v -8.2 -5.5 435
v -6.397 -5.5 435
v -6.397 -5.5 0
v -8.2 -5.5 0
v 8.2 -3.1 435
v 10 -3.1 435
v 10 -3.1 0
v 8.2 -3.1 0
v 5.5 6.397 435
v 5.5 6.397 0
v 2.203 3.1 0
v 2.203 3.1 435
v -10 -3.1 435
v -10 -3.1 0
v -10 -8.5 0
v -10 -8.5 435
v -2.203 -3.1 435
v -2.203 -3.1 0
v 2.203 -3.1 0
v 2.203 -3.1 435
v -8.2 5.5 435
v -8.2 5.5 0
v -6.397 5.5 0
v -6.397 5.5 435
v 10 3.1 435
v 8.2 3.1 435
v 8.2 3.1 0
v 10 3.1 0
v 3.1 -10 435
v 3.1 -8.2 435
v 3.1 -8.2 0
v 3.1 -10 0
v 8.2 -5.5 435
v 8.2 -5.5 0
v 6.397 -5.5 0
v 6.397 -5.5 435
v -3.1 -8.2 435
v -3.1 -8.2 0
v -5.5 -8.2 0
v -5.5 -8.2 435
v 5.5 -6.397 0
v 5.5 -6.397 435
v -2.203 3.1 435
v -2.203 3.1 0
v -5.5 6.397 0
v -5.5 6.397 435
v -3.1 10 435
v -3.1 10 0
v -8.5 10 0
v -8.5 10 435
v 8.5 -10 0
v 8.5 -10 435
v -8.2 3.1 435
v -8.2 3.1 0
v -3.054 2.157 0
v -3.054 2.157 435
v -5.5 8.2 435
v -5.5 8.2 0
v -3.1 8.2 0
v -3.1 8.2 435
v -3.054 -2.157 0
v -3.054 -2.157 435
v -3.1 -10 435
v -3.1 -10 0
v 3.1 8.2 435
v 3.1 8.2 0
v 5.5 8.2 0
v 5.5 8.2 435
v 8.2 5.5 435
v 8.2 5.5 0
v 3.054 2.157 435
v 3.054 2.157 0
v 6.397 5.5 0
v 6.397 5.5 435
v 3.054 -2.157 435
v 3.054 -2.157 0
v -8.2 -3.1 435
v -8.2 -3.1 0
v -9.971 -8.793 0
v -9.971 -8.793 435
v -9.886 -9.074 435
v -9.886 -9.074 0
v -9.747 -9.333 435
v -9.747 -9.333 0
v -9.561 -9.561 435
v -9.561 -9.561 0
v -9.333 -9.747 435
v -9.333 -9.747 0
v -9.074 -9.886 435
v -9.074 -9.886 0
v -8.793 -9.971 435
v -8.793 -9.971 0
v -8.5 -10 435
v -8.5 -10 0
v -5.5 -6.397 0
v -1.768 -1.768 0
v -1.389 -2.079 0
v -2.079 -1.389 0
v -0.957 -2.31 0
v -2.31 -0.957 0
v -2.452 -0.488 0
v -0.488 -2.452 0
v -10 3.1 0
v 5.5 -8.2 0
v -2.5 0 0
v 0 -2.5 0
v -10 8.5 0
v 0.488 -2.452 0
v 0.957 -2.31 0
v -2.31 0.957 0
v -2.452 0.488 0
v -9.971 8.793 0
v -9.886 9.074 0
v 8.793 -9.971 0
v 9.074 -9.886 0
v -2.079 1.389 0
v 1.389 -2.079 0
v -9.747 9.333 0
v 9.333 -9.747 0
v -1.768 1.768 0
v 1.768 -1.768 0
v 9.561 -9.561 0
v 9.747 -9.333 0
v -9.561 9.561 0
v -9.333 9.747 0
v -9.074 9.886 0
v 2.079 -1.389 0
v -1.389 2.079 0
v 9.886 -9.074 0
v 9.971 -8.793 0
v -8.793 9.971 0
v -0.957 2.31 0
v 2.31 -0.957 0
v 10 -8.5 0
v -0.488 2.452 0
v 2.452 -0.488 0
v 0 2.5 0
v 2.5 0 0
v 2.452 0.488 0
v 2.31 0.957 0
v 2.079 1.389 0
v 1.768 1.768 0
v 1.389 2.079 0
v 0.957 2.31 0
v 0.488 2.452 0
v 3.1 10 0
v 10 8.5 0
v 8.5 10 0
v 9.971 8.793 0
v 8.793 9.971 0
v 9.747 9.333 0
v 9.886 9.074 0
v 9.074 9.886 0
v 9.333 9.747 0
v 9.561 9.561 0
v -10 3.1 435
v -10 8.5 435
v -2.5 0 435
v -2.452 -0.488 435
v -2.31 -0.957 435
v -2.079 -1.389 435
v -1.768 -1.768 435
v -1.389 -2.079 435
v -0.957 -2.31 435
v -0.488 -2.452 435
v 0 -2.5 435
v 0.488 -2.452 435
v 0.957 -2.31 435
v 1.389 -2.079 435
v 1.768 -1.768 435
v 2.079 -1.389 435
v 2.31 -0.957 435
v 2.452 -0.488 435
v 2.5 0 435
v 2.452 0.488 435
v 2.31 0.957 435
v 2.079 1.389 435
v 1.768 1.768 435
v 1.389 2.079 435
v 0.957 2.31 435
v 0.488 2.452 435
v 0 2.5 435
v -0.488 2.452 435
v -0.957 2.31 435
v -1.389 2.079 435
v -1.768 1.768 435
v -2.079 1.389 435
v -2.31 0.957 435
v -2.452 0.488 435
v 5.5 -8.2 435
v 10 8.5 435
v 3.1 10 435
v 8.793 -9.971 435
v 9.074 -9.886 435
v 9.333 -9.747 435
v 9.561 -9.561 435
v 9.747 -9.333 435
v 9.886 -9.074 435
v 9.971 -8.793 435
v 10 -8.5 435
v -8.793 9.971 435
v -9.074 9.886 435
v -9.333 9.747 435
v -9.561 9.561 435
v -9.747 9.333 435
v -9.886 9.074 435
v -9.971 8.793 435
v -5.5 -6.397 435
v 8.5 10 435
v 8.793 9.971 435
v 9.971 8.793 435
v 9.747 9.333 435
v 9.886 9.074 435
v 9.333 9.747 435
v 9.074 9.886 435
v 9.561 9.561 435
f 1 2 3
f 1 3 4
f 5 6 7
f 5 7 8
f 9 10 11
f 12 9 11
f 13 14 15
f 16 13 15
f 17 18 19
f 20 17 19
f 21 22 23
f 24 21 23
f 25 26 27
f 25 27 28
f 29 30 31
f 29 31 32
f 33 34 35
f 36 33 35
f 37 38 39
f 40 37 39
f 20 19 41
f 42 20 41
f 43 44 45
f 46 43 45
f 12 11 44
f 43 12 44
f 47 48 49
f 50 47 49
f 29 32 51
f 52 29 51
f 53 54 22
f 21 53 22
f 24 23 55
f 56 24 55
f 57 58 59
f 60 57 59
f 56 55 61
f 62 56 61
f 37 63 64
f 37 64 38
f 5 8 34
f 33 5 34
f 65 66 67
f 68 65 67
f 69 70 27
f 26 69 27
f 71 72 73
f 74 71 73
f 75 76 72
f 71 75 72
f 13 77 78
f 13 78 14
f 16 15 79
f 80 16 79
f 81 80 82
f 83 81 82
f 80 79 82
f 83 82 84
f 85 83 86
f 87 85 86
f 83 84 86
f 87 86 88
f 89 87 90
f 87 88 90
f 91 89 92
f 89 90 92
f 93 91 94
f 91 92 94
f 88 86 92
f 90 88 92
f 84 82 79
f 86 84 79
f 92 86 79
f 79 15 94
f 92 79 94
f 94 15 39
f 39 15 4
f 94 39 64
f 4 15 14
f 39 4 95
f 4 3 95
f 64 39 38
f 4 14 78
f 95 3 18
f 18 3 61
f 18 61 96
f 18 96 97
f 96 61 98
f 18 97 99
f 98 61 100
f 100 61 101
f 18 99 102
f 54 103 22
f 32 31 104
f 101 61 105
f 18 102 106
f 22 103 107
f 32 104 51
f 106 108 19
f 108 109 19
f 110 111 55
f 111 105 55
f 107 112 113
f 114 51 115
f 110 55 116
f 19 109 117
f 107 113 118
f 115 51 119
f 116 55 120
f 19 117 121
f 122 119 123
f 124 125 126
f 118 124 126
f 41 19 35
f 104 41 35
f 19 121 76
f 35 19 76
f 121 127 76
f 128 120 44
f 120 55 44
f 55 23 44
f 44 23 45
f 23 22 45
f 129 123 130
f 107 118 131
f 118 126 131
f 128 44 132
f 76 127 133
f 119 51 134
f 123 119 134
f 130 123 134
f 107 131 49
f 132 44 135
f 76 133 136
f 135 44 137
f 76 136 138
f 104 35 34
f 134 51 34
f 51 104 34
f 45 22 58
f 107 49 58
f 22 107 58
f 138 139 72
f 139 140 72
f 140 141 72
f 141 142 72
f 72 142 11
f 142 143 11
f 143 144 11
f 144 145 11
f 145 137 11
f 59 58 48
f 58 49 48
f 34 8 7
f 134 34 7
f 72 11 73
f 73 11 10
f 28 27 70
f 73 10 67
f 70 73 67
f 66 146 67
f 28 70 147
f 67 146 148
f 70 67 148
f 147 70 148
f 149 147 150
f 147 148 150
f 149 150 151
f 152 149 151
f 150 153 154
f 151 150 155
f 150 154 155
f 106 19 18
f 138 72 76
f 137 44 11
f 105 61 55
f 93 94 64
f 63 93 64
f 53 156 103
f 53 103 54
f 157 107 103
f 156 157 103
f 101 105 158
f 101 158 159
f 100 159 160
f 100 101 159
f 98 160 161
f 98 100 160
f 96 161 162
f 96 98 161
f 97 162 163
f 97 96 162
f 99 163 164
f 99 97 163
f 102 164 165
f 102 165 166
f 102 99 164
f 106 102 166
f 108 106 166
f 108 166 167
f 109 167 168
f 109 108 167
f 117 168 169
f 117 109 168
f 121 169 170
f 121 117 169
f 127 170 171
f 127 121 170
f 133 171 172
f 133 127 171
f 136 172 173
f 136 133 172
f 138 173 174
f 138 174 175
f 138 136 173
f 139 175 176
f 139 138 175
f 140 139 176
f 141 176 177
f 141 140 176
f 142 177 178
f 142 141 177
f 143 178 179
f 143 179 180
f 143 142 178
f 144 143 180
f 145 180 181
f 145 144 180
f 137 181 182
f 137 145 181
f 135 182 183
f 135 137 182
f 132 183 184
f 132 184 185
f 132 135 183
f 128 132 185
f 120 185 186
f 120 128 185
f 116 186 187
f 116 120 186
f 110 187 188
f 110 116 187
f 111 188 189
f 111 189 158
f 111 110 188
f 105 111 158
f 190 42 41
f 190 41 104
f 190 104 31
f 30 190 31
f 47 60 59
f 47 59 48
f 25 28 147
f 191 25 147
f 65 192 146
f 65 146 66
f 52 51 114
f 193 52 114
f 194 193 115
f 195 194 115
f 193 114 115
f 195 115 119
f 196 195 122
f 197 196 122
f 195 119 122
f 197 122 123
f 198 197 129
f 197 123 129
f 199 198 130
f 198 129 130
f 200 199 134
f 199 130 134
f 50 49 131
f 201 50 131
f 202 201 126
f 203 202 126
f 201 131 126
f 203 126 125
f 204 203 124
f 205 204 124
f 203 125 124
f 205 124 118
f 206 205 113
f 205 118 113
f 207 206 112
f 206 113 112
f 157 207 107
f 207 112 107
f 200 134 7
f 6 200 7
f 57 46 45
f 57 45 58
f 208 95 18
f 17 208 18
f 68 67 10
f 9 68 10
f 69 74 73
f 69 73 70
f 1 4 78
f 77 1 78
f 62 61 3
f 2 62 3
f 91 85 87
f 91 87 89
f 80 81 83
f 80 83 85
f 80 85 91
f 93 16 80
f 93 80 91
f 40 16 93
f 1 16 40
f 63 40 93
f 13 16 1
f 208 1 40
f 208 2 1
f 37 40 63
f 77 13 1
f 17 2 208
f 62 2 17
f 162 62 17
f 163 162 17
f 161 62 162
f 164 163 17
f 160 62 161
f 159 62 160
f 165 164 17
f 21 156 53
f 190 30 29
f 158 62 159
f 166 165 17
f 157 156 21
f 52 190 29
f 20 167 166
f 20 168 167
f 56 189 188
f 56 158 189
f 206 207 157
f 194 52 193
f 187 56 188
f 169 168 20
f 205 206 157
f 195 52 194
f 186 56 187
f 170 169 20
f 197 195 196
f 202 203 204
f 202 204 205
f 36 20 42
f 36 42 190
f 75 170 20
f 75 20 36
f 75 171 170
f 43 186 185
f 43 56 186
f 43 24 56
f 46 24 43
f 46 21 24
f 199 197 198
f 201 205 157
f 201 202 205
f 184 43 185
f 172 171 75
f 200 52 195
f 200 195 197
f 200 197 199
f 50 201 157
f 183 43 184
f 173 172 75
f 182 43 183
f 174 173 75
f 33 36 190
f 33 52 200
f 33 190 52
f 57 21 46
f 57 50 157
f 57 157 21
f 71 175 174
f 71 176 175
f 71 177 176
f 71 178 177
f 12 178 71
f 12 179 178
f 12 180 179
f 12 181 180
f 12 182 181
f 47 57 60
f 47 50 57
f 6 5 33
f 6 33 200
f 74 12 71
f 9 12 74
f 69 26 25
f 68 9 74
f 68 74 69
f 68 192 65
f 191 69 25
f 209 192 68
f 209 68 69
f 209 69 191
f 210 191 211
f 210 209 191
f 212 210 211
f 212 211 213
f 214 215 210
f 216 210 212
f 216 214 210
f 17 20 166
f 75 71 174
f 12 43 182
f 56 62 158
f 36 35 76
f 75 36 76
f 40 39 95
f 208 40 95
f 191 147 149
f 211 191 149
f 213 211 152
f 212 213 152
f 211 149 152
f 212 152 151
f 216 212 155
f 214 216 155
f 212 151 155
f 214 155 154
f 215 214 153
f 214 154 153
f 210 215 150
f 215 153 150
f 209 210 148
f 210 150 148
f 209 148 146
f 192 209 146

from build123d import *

# Parameters (mm, degrees)
SKETCH_1_R      = 2.5
EXTRUDE_1_DEPTH = 435


with BuildPart() as part:
    # 草图1 → 凸台-拉伸1 (new body)
    with BuildSketch(Plane.XY):
        with BuildLine():
            Line((-8.2, -3.1), (-10, -3.1))
            Line((-10, -3.1), (-10, -8.5))
            ThreePointArc((-10, -8.5), (-9.560660172, -9.560660172), (-8.5, -10))
            Line((-8.5, -10), (-3.1, -10))
            Line((-3.1, -10), (-3.1, -8.2))
            Line((-3.1, -8.2), (-5.5, -8.2))
            Line((-5.5, -8.2), (-5.5, -6.397050155))
            Line((-5.5, -6.397050155), (-2.202949845, -3.1))
            Line((-2.202949845, -3.1), (2.202949845, -3.1))
            Line((2.202949845, -3.1), (5.5, -6.397050155))
            Line((5.5, -6.397050155), (5.5, -8.2))
            Line((5.5, -8.2), (3.1, -8.2))
            Line((3.1, -8.2), (3.1, -10))
            Line((3.1, -10), (8.5, -10))
            ThreePointArc((8.5, -10), (9.560660172, -9.560660172), (10, -8.5))
            Line((10, -8.5), (10, -3.1))
            Line((10, -3.1), (8.2, -3.1))
            Line((8.2, -3.1), (8.2, -5.5))
            Line((8.2, -5.5), (6.397050155, -5.5))
            Line((6.397050155, -5.5), (3.05412702, -2.157076865))
            Line((3.05412702, -2.157076865), (3.05412702, 2.157076865))
            Line((3.05412702, 2.157076865), (6.397050155, 5.5))
            Line((6.397050155, 5.5), (8.2, 5.5))
            Line((8.2, 5.5), (8.2, 3.1))
            Line((8.2, 3.1), (10, 3.1))
            Line((10, 3.1), (10, 8.5))
            ThreePointArc((10, 8.5), (9.560660172, 9.560660172), (8.5, 10))
            Line((8.5, 10), (3.1, 10))
            Line((3.1, 10), (3.1, 8.2))
            Line((3.1, 8.2), (5.5, 8.2))
            Line((5.5, 8.2), (5.5, 6.397050155))
            Line((5.5, 6.397050155), (2.202949845, 3.1))
            Line((2.202949845, 3.1), (-2.202949845, 3.1))
            Line((-2.202949845, 3.1), (-5.5, 6.397050155))
            Line((-5.5, 6.397050155), (-5.5, 8.2))
            Line((-5.5, 8.2), (-3.1, 8.2))
            Line((-3.1, 8.2), (-3.1, 10))
            Line((-3.1, 10), (-8.5, 10))
            ThreePointArc((-8.5, 10), (-9.560660172, 9.560660172), (-10, 8.5))
            Line((-10, 8.5), (-10, 3.1))
            Line((-10, 3.1), (-8.2, 3.1))
            Line((-8.2, 3.1), (-8.2, 5.5))
            Line((-8.2, 5.5), (-6.397050155, 5.5))
            Line((-6.397050155, 5.5), (-3.05412702, 2.157076865))
            Line((-3.05412702, 2.157076865), (-3.05412702, -2.157076865))
            Line((-3.05412702, -2.157076865), (-6.397050155, -5.5))
            Line((-6.397050155, -5.5), (-8.2, -5.5))
            Line((-8.2, -5.5), (-8.2, -3.1))
        make_face()
        with Locations(Location((0, 0, 0), (0, 0, 180))):
            Circle(SKETCH_1_R, mode=Mode.SUBTRACT)
    extrude(amount=EXTRUDE_1_DEPTH)


solid = part.part
